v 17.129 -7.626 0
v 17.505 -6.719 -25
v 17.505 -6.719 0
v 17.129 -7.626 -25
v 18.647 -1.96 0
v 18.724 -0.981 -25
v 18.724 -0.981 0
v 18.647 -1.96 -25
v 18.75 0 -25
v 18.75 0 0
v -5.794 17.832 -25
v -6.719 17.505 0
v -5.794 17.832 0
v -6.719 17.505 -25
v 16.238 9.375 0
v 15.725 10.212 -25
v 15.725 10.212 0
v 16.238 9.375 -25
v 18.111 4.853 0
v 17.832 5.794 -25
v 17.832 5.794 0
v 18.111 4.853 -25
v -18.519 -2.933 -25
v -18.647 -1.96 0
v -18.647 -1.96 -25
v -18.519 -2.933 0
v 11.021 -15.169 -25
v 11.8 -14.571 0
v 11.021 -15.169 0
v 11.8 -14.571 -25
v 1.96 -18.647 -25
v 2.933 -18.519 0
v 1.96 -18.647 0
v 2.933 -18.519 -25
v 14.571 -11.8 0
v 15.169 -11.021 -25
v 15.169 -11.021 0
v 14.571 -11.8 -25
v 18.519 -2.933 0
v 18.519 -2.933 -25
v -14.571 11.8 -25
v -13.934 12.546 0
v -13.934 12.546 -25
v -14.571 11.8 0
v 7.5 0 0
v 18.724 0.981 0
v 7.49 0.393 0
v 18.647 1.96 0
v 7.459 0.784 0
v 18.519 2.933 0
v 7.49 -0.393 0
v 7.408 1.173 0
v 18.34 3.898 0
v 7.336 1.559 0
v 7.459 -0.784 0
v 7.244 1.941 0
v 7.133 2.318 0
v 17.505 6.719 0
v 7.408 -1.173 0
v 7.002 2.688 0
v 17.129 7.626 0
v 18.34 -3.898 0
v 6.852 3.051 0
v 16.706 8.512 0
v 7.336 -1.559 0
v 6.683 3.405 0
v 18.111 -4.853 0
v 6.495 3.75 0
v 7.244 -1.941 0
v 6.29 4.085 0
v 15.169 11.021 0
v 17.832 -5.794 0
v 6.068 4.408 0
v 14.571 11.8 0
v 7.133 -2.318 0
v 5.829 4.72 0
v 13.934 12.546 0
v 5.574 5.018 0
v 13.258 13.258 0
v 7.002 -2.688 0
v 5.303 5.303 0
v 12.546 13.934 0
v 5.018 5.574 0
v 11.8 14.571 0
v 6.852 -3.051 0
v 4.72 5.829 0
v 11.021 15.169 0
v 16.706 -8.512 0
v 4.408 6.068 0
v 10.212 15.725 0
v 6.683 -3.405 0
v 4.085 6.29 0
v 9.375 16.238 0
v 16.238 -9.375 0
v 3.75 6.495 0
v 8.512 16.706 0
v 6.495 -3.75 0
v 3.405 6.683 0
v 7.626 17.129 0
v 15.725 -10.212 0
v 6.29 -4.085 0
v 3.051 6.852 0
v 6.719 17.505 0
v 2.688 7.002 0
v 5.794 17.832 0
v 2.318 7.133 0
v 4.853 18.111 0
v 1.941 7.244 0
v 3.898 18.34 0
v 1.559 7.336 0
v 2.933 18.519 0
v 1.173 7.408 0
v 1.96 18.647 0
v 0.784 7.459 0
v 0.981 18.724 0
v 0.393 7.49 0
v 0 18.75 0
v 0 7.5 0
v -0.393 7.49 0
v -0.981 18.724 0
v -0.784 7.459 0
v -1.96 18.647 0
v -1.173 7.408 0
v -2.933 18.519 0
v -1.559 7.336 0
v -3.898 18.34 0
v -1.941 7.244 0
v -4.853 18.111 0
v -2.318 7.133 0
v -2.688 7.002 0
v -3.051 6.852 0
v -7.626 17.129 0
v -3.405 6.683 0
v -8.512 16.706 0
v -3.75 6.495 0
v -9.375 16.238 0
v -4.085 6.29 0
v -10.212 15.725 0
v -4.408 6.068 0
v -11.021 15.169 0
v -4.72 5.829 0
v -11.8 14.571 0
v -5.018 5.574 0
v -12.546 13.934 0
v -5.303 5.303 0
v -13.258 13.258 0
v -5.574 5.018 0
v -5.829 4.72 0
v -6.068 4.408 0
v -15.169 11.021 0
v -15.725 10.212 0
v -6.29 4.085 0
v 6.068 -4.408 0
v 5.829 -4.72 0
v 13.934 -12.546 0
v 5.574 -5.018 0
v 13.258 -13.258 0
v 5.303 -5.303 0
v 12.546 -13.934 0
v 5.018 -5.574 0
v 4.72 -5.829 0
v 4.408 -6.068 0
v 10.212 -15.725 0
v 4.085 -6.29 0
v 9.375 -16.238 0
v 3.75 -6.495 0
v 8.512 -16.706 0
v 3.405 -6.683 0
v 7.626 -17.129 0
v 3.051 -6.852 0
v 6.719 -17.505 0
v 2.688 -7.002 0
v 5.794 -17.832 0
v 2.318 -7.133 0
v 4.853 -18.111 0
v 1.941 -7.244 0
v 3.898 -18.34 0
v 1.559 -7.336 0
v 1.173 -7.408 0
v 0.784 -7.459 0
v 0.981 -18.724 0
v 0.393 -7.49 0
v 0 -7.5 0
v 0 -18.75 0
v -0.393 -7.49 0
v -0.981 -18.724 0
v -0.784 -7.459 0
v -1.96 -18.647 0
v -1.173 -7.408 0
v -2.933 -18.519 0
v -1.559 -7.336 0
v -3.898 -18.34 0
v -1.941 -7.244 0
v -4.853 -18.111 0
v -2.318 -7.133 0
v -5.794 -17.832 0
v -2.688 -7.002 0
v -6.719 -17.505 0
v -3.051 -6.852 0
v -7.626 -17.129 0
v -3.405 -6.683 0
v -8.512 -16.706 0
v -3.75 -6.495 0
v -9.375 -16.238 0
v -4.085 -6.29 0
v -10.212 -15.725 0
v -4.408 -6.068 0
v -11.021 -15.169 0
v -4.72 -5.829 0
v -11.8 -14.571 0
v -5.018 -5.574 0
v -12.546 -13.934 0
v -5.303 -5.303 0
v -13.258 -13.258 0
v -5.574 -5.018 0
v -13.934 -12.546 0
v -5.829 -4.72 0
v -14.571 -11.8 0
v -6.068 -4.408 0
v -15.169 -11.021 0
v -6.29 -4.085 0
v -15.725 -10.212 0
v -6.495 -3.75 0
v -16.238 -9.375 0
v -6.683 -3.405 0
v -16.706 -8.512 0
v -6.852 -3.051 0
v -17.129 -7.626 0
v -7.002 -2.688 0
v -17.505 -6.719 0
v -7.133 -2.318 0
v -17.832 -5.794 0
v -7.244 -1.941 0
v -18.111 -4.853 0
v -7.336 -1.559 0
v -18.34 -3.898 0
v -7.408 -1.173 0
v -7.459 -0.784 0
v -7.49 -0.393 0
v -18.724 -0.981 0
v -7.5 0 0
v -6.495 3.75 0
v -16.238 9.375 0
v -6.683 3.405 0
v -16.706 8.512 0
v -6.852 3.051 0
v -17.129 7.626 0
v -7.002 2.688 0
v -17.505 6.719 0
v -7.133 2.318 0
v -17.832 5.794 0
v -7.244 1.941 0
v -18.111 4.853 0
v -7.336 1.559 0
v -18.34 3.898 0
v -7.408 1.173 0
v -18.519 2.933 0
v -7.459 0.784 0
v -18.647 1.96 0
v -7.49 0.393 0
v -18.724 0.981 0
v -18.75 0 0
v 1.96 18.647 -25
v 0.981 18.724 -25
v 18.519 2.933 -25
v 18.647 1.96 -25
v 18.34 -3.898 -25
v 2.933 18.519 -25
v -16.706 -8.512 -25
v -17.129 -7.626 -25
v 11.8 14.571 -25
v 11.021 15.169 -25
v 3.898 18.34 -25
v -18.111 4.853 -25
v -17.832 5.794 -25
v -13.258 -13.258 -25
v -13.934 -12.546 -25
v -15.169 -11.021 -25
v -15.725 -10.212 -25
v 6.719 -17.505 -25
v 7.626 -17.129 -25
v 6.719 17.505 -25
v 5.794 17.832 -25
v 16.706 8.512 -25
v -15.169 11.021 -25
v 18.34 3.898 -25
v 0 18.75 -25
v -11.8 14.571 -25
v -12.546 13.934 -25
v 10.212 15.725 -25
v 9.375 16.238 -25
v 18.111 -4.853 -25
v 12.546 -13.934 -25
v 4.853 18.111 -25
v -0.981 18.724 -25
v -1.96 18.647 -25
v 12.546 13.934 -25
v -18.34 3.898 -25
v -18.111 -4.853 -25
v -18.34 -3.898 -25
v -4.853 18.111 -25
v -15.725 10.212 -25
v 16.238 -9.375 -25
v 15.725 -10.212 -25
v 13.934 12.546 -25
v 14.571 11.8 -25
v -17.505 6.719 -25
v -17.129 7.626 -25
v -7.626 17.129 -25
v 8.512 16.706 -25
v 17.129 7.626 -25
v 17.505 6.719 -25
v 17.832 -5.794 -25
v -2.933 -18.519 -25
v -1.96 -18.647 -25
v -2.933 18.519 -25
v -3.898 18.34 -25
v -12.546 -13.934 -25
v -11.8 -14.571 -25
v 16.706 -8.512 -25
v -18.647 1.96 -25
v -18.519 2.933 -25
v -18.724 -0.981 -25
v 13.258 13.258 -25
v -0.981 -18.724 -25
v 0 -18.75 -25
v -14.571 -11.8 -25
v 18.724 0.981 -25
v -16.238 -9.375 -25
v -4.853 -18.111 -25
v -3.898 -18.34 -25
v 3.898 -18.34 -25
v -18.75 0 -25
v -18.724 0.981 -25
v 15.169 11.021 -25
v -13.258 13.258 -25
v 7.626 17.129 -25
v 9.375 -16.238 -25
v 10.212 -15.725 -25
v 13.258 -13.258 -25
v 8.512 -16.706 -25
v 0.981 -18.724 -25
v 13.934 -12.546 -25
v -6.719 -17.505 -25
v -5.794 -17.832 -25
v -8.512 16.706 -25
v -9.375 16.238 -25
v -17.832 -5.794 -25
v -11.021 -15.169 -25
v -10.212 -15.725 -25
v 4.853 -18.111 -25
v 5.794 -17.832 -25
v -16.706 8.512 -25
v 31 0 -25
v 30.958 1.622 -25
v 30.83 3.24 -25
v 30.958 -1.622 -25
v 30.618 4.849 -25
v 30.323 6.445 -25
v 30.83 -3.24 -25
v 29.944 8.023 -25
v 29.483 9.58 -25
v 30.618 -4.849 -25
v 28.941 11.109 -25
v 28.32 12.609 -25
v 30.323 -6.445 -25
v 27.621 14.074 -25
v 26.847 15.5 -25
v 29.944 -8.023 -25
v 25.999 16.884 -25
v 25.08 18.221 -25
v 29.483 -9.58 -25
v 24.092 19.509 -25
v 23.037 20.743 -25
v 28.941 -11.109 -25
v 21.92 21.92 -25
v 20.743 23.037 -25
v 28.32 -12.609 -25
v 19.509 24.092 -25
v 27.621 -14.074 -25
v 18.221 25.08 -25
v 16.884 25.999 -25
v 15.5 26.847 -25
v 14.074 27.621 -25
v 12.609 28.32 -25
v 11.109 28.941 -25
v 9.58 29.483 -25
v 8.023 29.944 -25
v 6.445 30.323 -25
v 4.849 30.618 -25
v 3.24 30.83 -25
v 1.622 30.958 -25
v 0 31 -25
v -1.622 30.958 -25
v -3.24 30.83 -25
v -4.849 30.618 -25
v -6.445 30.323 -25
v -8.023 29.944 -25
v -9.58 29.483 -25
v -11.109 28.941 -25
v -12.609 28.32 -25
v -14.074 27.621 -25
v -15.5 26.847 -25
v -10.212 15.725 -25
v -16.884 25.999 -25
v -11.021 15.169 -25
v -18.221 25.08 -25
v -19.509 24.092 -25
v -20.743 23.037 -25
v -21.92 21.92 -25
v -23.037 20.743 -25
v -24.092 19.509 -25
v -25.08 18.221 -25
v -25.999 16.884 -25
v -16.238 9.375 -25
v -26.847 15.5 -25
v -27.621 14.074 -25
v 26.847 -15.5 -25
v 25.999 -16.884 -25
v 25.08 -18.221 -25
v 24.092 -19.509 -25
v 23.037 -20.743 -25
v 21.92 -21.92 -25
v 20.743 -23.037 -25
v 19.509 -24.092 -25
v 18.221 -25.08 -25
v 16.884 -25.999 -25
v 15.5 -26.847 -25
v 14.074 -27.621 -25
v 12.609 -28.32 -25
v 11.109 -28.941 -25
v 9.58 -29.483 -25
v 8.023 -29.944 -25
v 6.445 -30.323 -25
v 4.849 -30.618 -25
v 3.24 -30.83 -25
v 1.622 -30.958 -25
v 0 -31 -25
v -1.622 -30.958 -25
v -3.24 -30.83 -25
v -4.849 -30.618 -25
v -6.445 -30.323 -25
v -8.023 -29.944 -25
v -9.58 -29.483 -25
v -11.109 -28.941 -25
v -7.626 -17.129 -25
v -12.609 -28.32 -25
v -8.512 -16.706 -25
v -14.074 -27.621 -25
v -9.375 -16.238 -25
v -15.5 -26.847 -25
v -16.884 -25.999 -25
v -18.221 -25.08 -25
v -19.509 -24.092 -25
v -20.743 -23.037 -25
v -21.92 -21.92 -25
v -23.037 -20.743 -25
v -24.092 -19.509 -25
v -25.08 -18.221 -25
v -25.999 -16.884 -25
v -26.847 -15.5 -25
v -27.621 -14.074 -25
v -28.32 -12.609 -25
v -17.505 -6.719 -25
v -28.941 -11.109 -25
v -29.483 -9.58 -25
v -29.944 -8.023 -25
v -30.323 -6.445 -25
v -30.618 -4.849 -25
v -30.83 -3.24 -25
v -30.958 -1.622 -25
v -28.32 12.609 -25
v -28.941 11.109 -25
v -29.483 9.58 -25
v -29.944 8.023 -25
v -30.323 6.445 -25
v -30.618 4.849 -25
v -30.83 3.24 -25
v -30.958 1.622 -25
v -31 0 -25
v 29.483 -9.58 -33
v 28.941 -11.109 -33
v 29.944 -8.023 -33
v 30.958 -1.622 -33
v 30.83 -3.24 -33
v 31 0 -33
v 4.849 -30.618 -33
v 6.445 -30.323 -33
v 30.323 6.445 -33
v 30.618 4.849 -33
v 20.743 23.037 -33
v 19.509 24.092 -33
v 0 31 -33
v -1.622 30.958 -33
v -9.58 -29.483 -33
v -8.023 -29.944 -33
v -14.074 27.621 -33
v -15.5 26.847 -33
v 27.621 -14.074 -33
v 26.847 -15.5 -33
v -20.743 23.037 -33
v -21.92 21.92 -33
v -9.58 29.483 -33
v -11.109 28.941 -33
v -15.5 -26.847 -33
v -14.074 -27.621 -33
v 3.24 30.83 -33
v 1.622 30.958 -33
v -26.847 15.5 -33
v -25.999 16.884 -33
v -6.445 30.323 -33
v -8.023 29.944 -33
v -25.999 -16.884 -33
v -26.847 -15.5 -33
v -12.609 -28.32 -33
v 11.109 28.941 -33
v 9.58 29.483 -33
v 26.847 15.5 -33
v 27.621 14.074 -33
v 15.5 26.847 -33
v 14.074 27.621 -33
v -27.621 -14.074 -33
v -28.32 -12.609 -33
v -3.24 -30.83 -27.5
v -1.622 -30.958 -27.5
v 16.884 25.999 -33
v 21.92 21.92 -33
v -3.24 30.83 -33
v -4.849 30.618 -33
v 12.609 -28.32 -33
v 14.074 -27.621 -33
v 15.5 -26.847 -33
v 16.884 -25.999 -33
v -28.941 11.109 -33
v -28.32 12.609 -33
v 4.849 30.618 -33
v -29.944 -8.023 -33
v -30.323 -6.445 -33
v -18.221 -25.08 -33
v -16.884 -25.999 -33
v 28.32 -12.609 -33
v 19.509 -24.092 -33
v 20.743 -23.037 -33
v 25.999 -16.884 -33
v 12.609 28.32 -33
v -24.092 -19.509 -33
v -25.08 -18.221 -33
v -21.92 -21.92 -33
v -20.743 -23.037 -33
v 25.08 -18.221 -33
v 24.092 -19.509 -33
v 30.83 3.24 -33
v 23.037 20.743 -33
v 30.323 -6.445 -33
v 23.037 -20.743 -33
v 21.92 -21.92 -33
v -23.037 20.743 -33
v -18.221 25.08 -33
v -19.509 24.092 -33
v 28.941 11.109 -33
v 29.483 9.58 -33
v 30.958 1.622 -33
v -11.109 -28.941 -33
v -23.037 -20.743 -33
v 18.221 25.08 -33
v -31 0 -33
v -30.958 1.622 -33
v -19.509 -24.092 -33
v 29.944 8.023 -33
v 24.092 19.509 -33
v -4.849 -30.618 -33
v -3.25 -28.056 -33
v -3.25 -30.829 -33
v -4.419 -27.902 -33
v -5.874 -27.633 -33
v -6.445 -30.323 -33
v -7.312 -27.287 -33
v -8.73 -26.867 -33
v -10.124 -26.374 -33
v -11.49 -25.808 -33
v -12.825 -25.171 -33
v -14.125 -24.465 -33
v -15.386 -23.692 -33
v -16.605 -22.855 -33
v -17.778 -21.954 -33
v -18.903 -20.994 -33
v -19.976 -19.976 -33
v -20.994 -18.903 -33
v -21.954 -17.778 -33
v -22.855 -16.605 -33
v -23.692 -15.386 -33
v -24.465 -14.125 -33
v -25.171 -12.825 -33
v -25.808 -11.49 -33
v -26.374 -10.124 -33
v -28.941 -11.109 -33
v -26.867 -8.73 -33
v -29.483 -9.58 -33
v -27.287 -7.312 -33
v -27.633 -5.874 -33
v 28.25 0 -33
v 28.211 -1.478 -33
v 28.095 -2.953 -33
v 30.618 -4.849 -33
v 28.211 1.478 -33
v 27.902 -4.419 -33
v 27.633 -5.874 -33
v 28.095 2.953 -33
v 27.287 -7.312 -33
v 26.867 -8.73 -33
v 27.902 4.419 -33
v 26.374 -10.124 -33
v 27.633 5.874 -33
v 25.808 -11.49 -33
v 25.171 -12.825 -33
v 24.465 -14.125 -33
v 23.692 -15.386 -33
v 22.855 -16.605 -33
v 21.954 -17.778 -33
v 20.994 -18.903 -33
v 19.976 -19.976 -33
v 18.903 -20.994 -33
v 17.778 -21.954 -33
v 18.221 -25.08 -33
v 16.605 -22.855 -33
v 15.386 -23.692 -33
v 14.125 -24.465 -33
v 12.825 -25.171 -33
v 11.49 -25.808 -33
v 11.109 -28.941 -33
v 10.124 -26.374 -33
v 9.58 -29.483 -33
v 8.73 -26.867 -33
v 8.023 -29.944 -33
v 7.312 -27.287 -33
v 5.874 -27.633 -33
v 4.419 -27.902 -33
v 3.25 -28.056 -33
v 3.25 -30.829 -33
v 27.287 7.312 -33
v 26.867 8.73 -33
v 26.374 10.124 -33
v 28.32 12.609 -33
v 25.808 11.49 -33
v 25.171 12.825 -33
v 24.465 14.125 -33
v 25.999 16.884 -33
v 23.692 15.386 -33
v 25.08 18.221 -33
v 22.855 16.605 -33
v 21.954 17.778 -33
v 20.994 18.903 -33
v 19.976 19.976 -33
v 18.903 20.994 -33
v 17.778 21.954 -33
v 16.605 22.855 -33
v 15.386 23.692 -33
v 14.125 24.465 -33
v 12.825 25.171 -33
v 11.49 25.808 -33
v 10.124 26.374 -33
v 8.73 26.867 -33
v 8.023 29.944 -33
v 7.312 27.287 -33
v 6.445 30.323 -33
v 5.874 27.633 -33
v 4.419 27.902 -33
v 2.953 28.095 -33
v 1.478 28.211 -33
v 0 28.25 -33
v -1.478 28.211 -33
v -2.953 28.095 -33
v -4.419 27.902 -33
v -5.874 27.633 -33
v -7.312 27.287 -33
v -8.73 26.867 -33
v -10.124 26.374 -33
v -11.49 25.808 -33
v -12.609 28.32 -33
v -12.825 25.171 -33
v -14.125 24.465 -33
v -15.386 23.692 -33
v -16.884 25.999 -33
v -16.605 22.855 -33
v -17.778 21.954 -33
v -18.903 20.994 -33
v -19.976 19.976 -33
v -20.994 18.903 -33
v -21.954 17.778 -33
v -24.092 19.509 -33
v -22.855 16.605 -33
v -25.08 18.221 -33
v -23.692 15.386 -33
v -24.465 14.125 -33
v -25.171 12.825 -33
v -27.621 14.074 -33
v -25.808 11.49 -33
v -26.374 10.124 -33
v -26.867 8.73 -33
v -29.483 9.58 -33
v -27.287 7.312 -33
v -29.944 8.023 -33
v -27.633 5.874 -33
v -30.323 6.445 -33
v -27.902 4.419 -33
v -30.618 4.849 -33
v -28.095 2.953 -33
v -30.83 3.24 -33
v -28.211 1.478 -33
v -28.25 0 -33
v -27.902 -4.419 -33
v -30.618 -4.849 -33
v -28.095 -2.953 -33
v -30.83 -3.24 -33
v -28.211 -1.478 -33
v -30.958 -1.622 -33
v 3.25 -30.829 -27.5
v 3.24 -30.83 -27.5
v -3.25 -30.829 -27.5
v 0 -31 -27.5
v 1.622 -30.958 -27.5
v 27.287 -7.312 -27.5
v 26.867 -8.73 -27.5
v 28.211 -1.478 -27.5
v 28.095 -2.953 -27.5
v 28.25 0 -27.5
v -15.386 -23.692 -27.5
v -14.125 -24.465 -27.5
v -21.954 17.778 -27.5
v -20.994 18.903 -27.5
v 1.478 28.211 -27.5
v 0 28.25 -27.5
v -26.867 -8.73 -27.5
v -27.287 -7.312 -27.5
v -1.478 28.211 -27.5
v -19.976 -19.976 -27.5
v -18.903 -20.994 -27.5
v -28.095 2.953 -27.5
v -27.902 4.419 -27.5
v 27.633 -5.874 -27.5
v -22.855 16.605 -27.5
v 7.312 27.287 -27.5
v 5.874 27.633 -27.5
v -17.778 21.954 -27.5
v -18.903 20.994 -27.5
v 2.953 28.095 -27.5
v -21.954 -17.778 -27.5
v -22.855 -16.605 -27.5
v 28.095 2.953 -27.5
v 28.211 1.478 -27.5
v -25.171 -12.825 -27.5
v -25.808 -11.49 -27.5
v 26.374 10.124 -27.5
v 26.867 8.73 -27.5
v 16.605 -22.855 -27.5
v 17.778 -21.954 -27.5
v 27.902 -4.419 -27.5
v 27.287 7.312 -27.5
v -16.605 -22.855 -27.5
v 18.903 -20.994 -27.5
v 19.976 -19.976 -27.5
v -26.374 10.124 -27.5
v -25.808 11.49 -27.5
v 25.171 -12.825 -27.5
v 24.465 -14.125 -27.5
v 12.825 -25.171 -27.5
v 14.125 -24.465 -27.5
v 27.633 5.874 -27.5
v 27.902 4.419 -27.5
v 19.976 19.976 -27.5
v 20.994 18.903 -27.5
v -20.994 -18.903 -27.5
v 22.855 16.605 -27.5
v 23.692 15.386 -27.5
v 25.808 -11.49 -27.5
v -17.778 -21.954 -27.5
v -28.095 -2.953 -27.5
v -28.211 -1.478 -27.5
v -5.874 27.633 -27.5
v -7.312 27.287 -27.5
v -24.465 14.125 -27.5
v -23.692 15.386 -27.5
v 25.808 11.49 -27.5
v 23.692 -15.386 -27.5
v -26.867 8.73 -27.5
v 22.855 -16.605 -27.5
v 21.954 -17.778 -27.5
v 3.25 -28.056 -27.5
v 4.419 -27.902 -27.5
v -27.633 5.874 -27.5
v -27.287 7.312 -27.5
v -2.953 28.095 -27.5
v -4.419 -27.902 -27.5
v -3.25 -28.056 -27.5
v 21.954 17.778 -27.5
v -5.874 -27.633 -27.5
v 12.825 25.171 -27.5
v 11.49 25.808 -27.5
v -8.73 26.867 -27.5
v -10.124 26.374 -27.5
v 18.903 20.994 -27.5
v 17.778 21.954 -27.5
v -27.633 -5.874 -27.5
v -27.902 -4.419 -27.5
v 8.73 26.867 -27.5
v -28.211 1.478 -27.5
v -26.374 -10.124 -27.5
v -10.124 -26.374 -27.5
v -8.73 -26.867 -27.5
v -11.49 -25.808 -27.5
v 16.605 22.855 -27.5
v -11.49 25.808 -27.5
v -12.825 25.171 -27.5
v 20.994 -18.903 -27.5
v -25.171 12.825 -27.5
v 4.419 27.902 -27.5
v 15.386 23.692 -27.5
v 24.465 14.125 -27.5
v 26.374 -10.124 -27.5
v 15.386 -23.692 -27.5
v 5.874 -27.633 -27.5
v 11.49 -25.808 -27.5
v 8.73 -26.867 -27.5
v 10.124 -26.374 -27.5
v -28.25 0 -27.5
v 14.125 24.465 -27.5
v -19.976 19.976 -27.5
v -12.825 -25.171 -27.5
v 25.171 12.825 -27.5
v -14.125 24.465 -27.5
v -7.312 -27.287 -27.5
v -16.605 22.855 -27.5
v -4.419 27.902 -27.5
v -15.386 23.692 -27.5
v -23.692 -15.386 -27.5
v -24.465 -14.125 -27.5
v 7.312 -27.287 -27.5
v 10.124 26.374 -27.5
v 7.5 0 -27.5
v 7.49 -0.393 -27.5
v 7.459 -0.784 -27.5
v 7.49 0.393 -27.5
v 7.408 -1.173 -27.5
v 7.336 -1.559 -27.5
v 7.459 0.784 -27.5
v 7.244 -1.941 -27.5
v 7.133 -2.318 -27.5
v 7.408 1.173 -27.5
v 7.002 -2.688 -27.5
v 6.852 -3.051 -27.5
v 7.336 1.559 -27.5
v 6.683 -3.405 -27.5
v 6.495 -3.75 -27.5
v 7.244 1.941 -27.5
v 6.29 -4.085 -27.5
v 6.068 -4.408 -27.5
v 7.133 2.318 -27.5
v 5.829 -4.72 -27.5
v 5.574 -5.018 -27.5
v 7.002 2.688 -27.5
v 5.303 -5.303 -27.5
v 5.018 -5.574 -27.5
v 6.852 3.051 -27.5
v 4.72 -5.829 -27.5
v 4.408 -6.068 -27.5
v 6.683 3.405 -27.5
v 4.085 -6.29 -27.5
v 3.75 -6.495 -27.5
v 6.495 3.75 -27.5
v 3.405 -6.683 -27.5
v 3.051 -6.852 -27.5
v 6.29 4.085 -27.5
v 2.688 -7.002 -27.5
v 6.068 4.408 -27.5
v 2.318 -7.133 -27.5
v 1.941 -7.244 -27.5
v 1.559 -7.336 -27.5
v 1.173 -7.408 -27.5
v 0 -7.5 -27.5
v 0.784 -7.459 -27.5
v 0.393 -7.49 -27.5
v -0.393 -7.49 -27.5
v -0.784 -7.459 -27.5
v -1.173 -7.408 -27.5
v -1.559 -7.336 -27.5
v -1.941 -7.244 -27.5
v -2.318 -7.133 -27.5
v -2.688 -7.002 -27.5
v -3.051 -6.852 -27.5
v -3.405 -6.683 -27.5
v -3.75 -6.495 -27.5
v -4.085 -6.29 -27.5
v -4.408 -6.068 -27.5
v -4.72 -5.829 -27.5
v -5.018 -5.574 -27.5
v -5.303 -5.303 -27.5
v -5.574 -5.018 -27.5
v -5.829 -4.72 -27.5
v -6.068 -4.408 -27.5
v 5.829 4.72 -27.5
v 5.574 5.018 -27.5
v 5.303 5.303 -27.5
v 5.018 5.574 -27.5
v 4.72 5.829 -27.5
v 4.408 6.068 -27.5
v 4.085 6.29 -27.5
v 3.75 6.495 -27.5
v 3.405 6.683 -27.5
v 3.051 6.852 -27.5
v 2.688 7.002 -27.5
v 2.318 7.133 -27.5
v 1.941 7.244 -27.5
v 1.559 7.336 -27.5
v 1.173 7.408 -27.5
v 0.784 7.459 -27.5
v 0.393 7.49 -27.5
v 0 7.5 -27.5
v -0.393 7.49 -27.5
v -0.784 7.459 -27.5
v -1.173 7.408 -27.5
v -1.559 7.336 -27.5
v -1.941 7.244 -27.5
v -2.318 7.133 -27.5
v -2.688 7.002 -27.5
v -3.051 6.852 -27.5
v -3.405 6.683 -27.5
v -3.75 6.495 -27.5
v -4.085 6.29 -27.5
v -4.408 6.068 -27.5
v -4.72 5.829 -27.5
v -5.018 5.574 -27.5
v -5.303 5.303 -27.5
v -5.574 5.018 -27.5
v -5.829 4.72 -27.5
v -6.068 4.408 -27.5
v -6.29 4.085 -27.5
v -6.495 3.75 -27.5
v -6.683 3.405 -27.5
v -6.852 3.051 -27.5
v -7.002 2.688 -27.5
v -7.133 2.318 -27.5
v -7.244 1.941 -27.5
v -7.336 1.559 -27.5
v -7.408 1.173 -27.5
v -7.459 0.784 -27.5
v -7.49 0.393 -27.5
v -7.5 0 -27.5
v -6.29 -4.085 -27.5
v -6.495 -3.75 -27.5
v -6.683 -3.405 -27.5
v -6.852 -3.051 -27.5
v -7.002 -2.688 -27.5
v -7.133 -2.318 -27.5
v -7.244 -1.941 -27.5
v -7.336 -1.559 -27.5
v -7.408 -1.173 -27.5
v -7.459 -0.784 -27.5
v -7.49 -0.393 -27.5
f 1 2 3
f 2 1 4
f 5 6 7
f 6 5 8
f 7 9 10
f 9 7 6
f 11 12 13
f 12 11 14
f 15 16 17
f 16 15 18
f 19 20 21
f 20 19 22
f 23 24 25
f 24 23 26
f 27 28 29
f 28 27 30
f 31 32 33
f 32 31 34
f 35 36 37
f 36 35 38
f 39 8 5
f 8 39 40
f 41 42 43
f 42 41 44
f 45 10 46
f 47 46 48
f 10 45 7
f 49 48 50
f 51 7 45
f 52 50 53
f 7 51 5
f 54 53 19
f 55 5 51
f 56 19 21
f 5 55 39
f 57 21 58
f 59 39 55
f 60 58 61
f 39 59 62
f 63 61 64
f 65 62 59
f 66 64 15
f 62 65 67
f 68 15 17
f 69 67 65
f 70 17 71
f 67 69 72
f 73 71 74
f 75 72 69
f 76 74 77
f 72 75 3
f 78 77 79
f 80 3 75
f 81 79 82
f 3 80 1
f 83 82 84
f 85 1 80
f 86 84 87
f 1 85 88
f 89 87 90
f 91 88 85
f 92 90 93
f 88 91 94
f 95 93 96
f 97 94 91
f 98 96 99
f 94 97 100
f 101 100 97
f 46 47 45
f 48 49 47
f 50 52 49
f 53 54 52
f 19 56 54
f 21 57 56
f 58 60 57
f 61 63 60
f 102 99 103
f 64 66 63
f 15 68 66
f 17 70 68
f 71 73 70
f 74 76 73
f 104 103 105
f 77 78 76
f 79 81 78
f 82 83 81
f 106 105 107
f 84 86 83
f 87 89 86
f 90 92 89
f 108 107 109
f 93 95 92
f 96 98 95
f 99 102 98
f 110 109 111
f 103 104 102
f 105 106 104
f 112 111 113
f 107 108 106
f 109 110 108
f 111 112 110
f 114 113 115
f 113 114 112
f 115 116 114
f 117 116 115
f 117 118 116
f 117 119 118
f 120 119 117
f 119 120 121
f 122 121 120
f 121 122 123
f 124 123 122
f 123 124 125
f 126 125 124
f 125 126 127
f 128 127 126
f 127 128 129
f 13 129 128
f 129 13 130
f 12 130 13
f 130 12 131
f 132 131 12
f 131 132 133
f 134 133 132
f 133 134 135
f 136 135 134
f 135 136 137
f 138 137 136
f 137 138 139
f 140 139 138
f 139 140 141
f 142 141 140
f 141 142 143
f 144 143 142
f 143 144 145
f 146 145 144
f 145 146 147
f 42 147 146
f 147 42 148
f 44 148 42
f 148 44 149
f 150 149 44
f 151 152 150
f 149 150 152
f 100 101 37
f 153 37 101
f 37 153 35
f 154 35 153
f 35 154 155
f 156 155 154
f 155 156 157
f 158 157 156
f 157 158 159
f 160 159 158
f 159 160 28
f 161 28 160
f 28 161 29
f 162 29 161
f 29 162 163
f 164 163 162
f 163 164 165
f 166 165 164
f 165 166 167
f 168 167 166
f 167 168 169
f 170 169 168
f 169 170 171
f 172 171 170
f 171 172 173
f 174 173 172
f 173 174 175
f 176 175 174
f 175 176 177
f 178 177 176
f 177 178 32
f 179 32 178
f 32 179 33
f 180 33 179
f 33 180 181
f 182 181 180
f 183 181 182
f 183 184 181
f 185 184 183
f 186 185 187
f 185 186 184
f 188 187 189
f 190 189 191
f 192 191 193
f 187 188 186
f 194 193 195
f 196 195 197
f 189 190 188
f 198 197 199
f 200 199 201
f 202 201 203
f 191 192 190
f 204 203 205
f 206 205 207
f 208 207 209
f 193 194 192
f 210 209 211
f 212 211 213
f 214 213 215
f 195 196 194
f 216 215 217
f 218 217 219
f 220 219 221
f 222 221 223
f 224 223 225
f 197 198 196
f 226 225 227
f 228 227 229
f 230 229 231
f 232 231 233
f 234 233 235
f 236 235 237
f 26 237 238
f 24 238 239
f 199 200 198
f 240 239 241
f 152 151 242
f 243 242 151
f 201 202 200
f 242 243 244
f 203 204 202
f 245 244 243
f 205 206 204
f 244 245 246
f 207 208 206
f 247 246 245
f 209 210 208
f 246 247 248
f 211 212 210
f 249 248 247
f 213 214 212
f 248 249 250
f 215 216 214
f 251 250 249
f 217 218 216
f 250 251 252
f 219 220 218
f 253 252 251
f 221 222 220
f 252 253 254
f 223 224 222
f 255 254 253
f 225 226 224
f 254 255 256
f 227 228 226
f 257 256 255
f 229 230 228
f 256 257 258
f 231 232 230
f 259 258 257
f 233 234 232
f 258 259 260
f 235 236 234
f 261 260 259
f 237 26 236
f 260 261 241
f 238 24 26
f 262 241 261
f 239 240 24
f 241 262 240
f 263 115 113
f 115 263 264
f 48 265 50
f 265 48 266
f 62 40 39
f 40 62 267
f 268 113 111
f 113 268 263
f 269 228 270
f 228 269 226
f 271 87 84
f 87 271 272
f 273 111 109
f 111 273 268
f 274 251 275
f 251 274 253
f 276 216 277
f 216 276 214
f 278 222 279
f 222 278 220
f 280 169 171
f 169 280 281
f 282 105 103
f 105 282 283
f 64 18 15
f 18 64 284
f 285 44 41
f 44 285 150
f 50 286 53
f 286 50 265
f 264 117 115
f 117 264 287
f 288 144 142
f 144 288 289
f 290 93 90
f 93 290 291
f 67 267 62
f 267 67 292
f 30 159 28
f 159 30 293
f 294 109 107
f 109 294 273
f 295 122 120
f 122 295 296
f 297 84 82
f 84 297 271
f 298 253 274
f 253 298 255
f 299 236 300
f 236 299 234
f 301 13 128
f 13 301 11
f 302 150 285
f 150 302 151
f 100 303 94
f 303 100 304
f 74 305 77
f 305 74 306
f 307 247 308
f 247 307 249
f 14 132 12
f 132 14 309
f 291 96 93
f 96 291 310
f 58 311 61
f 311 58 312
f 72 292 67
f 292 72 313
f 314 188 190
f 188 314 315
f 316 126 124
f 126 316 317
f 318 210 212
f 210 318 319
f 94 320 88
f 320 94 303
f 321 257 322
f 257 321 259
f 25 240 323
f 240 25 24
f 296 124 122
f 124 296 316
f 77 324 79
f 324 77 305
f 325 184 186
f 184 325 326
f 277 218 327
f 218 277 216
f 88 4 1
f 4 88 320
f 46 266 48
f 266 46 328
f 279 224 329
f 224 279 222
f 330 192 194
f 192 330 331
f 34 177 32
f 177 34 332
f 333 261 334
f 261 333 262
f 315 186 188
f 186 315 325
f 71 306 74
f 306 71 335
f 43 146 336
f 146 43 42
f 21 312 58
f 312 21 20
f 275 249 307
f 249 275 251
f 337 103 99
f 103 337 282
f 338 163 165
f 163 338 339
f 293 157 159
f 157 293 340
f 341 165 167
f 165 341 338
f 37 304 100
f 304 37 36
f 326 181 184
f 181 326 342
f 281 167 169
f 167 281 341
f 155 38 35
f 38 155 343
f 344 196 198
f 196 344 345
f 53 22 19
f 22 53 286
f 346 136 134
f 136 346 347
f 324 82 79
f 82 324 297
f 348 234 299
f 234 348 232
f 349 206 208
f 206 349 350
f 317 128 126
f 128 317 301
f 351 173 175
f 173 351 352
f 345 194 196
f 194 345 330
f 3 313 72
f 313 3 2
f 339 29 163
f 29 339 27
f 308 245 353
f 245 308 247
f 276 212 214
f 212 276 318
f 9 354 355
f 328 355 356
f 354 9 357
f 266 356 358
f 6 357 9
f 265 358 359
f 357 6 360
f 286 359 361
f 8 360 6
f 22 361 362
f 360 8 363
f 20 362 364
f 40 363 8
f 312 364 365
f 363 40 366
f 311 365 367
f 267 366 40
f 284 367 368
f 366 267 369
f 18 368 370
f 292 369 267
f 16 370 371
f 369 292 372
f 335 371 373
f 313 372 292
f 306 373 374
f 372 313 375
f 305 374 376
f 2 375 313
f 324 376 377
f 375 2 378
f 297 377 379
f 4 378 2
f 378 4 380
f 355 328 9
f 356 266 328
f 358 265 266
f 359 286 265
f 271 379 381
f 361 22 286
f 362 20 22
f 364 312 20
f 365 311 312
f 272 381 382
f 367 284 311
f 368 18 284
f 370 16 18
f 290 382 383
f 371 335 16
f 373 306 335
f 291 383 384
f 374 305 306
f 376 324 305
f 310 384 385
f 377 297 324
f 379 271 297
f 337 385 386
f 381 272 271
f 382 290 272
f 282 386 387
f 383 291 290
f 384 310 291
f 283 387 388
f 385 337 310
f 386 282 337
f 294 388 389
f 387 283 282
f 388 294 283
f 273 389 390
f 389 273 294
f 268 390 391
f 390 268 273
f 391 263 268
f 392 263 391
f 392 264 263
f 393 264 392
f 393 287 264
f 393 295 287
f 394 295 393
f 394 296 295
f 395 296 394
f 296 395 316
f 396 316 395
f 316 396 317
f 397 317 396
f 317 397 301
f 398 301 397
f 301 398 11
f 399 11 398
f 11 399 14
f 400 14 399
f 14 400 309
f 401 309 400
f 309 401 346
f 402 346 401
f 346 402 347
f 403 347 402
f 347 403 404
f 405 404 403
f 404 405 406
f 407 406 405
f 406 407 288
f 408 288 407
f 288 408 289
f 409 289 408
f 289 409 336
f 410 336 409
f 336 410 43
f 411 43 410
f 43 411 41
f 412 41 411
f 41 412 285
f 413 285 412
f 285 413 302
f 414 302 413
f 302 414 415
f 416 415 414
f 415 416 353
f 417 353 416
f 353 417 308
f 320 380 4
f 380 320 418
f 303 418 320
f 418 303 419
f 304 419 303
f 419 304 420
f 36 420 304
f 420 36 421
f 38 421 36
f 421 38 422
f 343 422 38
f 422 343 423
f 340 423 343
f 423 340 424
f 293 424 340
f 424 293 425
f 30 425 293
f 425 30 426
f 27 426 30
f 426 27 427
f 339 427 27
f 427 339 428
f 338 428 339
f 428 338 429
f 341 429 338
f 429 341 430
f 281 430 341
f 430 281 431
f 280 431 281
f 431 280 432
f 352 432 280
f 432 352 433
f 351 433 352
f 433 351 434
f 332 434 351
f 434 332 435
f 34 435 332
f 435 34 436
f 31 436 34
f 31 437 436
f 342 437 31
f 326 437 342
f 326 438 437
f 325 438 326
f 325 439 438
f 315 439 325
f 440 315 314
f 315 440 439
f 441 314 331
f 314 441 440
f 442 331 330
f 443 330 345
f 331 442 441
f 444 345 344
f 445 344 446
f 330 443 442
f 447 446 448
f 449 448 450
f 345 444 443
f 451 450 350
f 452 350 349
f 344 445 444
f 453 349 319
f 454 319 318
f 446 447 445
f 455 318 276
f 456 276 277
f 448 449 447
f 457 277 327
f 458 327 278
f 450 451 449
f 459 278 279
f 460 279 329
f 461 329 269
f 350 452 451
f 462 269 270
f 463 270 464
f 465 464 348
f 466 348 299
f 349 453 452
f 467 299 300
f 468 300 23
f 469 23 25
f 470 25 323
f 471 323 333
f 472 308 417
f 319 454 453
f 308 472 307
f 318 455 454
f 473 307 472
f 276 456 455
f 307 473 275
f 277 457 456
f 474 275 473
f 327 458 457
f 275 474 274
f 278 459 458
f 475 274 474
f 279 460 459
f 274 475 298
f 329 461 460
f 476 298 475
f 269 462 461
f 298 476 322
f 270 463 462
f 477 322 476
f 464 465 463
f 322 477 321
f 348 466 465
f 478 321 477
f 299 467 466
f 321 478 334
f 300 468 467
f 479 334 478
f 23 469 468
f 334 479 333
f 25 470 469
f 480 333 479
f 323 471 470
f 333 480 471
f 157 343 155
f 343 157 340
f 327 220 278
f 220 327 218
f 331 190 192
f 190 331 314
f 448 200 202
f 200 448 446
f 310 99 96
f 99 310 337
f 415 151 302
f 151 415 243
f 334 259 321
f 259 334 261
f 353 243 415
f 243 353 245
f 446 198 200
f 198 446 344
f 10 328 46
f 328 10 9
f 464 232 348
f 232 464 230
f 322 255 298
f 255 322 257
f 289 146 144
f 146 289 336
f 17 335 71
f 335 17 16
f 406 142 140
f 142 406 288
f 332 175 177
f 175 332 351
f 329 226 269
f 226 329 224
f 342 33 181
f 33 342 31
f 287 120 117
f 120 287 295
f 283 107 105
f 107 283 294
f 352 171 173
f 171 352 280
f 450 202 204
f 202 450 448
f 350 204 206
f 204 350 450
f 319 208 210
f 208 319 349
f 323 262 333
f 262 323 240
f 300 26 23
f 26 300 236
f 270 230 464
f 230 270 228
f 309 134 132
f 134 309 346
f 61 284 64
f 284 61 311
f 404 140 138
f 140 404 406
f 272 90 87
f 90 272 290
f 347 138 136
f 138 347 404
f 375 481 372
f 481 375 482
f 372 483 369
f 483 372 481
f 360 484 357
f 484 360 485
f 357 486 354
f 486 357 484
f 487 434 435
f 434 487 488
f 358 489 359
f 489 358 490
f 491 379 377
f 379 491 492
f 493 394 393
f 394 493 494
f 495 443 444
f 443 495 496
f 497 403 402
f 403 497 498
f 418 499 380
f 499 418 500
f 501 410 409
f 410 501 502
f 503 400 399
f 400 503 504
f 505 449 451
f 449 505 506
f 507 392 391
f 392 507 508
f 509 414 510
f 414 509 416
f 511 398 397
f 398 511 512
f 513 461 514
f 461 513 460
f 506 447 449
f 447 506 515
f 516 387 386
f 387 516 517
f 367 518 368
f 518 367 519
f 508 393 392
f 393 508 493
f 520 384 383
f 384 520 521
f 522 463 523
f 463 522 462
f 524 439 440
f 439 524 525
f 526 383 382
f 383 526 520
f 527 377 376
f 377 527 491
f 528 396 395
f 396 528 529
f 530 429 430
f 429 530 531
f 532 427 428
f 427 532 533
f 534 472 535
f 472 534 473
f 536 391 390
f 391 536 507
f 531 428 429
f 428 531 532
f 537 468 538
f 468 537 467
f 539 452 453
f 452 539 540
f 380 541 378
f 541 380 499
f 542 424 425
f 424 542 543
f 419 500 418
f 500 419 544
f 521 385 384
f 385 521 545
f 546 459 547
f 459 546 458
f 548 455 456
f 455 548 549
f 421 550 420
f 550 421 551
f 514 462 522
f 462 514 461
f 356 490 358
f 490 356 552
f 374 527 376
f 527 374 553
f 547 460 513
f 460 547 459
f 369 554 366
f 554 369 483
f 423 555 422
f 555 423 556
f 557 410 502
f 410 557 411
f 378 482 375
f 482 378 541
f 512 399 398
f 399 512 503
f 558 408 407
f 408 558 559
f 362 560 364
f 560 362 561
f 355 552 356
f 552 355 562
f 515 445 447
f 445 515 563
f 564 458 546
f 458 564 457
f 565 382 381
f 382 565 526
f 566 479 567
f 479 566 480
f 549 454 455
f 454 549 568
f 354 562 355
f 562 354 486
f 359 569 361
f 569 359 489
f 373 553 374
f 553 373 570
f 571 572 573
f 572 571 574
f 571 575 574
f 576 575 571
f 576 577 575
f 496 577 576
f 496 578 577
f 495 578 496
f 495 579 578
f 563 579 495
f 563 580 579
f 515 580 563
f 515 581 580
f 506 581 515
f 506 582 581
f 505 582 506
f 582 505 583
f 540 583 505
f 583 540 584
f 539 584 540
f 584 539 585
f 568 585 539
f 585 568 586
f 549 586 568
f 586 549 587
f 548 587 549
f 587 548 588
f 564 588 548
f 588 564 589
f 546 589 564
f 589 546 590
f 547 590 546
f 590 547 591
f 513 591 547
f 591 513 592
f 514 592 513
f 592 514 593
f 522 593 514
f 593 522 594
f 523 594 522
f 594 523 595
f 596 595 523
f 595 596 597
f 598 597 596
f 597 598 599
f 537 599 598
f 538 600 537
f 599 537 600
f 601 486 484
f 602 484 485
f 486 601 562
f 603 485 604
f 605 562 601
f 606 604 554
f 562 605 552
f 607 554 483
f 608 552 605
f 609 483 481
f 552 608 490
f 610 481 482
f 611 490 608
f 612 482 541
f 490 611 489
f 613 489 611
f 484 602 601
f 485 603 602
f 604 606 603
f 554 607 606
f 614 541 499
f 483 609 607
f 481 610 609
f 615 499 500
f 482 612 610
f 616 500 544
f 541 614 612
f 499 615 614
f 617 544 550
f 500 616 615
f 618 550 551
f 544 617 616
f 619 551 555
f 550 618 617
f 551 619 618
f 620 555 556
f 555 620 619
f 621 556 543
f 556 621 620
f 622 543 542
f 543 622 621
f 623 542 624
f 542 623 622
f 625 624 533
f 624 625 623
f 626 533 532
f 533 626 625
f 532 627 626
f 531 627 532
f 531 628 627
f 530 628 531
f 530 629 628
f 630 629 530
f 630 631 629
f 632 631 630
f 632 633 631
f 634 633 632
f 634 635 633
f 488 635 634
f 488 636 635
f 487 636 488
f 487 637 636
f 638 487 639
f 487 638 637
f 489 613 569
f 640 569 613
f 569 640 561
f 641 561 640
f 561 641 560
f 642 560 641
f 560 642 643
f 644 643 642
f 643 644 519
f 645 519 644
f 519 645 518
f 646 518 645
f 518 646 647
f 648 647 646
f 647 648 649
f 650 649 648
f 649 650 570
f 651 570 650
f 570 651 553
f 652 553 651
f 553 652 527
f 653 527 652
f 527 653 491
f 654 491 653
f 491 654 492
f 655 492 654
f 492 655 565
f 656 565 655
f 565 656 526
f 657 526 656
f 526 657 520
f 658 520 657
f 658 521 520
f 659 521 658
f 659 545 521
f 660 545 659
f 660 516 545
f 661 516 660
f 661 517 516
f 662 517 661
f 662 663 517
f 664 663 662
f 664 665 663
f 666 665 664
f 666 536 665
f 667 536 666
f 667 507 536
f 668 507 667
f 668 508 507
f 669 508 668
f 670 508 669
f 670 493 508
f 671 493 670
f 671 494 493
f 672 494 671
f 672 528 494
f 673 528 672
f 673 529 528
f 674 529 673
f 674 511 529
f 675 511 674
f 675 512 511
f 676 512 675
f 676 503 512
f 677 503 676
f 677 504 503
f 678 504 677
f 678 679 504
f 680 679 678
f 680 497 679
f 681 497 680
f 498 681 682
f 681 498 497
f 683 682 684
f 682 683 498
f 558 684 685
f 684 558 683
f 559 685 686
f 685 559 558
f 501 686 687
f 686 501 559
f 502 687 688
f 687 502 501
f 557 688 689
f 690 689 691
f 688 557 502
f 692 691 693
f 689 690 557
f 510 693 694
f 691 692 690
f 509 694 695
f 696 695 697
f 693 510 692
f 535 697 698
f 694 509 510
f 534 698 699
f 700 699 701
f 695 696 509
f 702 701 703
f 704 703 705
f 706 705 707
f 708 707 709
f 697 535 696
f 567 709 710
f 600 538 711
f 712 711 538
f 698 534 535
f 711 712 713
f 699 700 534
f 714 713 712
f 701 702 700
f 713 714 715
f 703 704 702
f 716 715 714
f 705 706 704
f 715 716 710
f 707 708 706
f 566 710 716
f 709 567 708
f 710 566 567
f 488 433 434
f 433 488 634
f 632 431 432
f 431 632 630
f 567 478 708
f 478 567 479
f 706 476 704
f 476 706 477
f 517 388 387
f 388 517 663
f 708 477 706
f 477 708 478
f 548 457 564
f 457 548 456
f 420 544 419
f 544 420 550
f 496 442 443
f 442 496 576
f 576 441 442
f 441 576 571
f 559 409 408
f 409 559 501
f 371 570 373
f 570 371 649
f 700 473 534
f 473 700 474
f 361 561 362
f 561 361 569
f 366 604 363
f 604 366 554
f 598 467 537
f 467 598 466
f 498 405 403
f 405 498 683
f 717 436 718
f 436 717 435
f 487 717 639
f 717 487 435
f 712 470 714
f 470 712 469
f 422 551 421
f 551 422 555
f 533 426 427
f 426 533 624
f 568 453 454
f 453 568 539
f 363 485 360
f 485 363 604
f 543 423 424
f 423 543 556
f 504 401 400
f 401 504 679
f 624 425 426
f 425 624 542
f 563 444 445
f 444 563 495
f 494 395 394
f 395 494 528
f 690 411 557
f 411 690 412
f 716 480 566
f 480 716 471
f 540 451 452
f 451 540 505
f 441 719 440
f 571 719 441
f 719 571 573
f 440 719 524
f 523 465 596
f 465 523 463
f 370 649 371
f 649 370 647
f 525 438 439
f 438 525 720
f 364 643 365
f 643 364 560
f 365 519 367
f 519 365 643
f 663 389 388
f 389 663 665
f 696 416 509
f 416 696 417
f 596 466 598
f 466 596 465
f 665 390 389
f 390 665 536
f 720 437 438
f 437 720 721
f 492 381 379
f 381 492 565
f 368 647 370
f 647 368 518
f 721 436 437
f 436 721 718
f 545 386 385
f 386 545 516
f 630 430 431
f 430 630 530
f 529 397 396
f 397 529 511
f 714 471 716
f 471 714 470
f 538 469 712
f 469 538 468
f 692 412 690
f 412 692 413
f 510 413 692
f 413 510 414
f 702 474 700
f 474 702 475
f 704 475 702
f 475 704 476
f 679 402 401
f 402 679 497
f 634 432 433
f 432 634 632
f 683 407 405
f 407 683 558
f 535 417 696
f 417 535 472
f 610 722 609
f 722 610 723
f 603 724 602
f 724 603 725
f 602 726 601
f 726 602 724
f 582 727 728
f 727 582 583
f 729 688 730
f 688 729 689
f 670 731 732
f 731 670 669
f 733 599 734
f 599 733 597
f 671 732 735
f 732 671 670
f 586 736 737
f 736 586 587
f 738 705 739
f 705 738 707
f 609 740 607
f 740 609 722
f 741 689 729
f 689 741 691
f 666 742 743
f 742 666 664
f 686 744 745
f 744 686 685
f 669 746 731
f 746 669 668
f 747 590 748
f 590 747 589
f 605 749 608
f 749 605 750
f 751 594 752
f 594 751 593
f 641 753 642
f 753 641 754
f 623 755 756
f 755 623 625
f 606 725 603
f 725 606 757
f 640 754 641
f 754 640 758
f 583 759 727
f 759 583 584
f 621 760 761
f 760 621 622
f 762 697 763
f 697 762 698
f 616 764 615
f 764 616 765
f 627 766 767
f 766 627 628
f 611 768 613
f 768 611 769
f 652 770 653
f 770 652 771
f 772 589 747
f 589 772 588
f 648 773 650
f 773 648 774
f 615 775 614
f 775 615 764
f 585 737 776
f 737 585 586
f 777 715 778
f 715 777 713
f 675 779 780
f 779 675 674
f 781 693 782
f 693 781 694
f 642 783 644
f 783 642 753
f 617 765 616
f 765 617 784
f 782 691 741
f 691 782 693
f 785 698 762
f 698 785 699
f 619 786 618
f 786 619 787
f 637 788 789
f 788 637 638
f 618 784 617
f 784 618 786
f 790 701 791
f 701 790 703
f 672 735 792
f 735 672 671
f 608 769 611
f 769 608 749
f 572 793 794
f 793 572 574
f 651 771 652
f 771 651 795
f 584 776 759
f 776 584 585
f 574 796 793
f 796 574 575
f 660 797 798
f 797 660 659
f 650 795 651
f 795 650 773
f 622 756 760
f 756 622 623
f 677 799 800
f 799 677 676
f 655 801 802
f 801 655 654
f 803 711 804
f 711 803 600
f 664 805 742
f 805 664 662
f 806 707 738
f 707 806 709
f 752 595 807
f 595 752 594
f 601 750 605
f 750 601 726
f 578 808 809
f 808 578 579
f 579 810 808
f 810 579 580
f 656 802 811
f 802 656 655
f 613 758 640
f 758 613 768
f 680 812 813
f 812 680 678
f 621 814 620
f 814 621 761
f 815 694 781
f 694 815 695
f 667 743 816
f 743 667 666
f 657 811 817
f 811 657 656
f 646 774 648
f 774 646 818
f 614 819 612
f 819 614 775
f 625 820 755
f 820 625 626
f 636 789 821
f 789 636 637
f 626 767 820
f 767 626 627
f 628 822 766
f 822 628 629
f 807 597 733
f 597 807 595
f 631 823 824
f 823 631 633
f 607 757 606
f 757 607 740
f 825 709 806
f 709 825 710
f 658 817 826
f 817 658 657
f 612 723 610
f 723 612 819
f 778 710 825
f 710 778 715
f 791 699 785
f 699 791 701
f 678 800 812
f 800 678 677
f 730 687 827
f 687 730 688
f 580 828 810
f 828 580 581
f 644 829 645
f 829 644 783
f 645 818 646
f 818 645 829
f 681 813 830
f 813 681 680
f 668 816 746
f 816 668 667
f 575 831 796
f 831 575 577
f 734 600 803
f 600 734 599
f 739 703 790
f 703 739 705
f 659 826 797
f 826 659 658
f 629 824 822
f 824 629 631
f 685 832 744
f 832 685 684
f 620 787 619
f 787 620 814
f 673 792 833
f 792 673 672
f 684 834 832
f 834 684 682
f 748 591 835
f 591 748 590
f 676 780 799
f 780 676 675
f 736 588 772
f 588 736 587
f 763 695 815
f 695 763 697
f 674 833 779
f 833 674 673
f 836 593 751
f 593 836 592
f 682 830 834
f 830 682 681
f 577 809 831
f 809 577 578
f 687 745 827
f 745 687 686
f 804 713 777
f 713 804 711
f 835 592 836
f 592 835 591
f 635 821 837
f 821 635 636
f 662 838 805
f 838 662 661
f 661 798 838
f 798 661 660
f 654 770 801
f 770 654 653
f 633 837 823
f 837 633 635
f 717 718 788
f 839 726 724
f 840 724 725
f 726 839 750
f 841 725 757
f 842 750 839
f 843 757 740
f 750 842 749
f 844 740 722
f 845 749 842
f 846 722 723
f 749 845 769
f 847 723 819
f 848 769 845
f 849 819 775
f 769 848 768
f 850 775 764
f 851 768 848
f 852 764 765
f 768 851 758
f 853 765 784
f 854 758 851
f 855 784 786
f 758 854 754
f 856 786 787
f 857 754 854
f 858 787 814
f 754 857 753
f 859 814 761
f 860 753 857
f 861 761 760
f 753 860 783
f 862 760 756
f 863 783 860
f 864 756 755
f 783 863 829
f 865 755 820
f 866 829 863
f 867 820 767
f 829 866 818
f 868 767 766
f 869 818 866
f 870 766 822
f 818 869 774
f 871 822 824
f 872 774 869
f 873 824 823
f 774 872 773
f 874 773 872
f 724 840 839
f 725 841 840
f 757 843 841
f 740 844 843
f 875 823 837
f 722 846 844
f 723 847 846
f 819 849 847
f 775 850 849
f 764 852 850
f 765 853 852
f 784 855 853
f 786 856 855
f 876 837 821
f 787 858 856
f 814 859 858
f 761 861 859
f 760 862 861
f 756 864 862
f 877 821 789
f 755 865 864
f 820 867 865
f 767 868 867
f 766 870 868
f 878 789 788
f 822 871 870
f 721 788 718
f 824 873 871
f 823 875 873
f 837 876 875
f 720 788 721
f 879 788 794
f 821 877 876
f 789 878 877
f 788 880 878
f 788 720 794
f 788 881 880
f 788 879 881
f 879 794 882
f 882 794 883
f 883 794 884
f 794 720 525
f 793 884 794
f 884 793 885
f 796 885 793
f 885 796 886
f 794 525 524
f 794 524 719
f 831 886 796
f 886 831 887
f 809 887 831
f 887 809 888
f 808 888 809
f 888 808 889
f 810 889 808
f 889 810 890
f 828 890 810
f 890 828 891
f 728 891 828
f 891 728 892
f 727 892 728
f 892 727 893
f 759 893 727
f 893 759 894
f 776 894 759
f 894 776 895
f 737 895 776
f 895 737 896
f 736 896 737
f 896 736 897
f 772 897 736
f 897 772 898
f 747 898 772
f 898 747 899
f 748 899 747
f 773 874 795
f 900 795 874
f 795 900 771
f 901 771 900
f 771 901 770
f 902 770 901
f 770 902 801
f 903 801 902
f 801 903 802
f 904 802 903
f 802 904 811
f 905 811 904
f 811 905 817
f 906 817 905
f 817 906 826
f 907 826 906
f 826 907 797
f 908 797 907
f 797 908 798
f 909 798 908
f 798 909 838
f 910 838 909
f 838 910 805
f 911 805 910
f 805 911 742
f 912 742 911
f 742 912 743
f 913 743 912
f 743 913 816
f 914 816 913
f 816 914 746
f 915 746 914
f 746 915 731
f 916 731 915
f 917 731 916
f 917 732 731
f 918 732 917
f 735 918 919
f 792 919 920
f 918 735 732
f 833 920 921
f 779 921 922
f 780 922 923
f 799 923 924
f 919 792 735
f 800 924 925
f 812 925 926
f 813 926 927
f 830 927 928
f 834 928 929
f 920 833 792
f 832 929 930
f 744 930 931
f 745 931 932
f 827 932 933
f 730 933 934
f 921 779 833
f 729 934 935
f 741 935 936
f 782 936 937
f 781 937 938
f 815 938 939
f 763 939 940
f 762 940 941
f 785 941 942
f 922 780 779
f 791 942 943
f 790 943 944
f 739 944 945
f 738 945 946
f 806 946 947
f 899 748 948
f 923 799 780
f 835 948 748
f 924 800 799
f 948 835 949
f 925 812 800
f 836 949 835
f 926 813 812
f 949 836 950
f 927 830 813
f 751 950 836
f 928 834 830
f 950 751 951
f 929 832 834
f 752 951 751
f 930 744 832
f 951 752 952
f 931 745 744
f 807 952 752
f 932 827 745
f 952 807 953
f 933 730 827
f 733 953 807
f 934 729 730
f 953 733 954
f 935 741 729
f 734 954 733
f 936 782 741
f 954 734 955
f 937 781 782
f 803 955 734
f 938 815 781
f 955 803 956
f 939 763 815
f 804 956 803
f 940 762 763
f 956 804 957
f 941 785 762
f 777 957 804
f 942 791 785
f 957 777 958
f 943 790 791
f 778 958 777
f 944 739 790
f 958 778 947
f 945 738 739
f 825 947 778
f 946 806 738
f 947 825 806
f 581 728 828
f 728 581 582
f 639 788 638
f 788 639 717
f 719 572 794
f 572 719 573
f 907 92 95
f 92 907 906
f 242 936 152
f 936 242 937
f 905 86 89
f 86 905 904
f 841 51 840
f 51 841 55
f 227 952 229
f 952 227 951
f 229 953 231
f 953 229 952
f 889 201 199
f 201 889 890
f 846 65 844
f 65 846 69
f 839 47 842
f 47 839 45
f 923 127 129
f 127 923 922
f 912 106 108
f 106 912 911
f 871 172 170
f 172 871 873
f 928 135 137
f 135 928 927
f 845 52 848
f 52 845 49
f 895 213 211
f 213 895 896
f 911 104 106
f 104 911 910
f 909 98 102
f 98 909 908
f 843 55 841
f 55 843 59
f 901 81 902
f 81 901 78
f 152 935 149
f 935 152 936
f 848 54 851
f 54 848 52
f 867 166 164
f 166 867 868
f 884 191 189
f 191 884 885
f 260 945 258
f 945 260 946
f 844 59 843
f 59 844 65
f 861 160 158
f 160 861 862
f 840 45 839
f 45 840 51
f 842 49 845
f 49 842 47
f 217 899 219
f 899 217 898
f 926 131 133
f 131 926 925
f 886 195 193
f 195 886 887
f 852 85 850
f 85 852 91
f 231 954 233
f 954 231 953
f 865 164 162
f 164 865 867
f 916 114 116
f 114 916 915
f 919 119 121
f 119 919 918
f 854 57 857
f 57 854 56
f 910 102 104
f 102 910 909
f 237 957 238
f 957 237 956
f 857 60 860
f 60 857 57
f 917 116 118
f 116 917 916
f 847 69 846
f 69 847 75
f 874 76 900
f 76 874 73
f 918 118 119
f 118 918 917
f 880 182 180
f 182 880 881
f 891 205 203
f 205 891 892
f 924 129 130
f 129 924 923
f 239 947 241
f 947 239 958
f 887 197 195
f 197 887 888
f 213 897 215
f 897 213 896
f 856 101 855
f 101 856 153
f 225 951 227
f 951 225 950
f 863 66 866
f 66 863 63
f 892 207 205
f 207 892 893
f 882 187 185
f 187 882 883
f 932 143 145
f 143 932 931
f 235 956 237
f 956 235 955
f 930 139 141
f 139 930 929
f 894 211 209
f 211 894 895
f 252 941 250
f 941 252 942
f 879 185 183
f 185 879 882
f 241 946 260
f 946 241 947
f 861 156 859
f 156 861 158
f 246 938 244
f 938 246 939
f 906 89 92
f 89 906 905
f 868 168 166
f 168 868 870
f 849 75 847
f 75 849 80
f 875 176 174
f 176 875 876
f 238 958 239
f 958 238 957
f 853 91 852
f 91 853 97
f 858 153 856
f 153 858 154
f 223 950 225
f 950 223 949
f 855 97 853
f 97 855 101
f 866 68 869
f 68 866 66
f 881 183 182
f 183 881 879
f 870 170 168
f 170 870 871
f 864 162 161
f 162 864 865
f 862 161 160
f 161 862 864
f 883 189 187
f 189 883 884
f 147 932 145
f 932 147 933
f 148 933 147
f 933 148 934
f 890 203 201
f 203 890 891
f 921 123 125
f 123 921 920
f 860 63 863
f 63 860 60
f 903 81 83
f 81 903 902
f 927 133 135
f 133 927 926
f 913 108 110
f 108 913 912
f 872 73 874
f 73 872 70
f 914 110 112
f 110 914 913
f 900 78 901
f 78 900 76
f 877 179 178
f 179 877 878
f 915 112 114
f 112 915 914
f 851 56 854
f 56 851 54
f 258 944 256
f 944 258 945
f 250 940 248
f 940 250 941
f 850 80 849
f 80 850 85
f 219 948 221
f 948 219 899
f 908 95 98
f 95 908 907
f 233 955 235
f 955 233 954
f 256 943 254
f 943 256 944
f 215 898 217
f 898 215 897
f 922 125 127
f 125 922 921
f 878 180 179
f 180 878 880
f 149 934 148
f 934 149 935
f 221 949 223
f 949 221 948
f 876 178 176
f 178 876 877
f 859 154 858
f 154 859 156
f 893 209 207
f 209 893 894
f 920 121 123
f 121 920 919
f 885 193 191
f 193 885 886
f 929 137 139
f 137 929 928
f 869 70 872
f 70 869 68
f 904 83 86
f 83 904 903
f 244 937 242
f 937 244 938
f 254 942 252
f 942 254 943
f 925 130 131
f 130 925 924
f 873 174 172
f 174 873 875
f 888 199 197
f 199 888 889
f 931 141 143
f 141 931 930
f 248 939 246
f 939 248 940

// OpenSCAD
// 2015-2020 Ford F-150 Coin Holder MagSafe Mount
// Parametric configuration

/* [Dimensions] */
// Diameter of the cylinder that inserts into the dash. Print a test ring first!
insert_dia = 37.5;

// How deep the plug goes into the dashboard
insert_depth = 25.0;

// Outer diameter of the visible face plate
face_dia = 62.0;

// Thickness of the face plate holding the MagSafe puck
face_thickness = 8.0;

// Diameter of the MagSafe puck (Apple OEM is 55.9mm)
magsafe_dia = 56.5;

// How deep the MagSafe puck sits inside the face
magsafe_depth = 5.5;

// Width of the slot for the charging cable to pass through
cable_slot_width = 6.5;

/* [Hidden] */
$fn = 120; // High resolution for smooth friction fit

module magsafe_mount() {
    difference() {
        // --- ADDITIVE GEOMETRY ---
        union() {
            // 1. The Insert Plug (goes into the dash)
            cylinder(h=insert_depth, d=insert_dia);

            // 2. The Face Plate (sits outside the dash)
            translate([0, 0, insert_depth])
                cylinder(h=face_thickness, d=face_dia);
        }

        // --- SUBTRACTIVE GEOMETRY (CUTOUTS) ---

        // 3. MagSafe Puck Recess Cutout
        // Cut from the top down into the face plate
        translate([0, 0, insert_depth + face_thickness - magsafe_depth])
            cylinder(h=magsafe_depth + 1, d=magsafe_dia);

        // 4. Cable Routing Slot Cutout
        // Cuts a channel from the center of the MagSafe down through the bottom lip
        translate([-cable_slot_width/2, 0, insert_depth + face_thickness - magsafe_depth])
            cube([cable_slot_width, face_dia/2 + 1, magsafe_depth + 1]);

        // 5. Center wire push-hole
        // Allows you to poke the MagSafe puck out from the back if you need to remove it
        translate([0, 0, -1])
            cylinder(h=insert_depth + face_thickness + 2, d=15);
    }
}

// Generate the part
// Rotate face-down for printing without supports
rotate([180, 0, 0])
    magsafe_mount();
